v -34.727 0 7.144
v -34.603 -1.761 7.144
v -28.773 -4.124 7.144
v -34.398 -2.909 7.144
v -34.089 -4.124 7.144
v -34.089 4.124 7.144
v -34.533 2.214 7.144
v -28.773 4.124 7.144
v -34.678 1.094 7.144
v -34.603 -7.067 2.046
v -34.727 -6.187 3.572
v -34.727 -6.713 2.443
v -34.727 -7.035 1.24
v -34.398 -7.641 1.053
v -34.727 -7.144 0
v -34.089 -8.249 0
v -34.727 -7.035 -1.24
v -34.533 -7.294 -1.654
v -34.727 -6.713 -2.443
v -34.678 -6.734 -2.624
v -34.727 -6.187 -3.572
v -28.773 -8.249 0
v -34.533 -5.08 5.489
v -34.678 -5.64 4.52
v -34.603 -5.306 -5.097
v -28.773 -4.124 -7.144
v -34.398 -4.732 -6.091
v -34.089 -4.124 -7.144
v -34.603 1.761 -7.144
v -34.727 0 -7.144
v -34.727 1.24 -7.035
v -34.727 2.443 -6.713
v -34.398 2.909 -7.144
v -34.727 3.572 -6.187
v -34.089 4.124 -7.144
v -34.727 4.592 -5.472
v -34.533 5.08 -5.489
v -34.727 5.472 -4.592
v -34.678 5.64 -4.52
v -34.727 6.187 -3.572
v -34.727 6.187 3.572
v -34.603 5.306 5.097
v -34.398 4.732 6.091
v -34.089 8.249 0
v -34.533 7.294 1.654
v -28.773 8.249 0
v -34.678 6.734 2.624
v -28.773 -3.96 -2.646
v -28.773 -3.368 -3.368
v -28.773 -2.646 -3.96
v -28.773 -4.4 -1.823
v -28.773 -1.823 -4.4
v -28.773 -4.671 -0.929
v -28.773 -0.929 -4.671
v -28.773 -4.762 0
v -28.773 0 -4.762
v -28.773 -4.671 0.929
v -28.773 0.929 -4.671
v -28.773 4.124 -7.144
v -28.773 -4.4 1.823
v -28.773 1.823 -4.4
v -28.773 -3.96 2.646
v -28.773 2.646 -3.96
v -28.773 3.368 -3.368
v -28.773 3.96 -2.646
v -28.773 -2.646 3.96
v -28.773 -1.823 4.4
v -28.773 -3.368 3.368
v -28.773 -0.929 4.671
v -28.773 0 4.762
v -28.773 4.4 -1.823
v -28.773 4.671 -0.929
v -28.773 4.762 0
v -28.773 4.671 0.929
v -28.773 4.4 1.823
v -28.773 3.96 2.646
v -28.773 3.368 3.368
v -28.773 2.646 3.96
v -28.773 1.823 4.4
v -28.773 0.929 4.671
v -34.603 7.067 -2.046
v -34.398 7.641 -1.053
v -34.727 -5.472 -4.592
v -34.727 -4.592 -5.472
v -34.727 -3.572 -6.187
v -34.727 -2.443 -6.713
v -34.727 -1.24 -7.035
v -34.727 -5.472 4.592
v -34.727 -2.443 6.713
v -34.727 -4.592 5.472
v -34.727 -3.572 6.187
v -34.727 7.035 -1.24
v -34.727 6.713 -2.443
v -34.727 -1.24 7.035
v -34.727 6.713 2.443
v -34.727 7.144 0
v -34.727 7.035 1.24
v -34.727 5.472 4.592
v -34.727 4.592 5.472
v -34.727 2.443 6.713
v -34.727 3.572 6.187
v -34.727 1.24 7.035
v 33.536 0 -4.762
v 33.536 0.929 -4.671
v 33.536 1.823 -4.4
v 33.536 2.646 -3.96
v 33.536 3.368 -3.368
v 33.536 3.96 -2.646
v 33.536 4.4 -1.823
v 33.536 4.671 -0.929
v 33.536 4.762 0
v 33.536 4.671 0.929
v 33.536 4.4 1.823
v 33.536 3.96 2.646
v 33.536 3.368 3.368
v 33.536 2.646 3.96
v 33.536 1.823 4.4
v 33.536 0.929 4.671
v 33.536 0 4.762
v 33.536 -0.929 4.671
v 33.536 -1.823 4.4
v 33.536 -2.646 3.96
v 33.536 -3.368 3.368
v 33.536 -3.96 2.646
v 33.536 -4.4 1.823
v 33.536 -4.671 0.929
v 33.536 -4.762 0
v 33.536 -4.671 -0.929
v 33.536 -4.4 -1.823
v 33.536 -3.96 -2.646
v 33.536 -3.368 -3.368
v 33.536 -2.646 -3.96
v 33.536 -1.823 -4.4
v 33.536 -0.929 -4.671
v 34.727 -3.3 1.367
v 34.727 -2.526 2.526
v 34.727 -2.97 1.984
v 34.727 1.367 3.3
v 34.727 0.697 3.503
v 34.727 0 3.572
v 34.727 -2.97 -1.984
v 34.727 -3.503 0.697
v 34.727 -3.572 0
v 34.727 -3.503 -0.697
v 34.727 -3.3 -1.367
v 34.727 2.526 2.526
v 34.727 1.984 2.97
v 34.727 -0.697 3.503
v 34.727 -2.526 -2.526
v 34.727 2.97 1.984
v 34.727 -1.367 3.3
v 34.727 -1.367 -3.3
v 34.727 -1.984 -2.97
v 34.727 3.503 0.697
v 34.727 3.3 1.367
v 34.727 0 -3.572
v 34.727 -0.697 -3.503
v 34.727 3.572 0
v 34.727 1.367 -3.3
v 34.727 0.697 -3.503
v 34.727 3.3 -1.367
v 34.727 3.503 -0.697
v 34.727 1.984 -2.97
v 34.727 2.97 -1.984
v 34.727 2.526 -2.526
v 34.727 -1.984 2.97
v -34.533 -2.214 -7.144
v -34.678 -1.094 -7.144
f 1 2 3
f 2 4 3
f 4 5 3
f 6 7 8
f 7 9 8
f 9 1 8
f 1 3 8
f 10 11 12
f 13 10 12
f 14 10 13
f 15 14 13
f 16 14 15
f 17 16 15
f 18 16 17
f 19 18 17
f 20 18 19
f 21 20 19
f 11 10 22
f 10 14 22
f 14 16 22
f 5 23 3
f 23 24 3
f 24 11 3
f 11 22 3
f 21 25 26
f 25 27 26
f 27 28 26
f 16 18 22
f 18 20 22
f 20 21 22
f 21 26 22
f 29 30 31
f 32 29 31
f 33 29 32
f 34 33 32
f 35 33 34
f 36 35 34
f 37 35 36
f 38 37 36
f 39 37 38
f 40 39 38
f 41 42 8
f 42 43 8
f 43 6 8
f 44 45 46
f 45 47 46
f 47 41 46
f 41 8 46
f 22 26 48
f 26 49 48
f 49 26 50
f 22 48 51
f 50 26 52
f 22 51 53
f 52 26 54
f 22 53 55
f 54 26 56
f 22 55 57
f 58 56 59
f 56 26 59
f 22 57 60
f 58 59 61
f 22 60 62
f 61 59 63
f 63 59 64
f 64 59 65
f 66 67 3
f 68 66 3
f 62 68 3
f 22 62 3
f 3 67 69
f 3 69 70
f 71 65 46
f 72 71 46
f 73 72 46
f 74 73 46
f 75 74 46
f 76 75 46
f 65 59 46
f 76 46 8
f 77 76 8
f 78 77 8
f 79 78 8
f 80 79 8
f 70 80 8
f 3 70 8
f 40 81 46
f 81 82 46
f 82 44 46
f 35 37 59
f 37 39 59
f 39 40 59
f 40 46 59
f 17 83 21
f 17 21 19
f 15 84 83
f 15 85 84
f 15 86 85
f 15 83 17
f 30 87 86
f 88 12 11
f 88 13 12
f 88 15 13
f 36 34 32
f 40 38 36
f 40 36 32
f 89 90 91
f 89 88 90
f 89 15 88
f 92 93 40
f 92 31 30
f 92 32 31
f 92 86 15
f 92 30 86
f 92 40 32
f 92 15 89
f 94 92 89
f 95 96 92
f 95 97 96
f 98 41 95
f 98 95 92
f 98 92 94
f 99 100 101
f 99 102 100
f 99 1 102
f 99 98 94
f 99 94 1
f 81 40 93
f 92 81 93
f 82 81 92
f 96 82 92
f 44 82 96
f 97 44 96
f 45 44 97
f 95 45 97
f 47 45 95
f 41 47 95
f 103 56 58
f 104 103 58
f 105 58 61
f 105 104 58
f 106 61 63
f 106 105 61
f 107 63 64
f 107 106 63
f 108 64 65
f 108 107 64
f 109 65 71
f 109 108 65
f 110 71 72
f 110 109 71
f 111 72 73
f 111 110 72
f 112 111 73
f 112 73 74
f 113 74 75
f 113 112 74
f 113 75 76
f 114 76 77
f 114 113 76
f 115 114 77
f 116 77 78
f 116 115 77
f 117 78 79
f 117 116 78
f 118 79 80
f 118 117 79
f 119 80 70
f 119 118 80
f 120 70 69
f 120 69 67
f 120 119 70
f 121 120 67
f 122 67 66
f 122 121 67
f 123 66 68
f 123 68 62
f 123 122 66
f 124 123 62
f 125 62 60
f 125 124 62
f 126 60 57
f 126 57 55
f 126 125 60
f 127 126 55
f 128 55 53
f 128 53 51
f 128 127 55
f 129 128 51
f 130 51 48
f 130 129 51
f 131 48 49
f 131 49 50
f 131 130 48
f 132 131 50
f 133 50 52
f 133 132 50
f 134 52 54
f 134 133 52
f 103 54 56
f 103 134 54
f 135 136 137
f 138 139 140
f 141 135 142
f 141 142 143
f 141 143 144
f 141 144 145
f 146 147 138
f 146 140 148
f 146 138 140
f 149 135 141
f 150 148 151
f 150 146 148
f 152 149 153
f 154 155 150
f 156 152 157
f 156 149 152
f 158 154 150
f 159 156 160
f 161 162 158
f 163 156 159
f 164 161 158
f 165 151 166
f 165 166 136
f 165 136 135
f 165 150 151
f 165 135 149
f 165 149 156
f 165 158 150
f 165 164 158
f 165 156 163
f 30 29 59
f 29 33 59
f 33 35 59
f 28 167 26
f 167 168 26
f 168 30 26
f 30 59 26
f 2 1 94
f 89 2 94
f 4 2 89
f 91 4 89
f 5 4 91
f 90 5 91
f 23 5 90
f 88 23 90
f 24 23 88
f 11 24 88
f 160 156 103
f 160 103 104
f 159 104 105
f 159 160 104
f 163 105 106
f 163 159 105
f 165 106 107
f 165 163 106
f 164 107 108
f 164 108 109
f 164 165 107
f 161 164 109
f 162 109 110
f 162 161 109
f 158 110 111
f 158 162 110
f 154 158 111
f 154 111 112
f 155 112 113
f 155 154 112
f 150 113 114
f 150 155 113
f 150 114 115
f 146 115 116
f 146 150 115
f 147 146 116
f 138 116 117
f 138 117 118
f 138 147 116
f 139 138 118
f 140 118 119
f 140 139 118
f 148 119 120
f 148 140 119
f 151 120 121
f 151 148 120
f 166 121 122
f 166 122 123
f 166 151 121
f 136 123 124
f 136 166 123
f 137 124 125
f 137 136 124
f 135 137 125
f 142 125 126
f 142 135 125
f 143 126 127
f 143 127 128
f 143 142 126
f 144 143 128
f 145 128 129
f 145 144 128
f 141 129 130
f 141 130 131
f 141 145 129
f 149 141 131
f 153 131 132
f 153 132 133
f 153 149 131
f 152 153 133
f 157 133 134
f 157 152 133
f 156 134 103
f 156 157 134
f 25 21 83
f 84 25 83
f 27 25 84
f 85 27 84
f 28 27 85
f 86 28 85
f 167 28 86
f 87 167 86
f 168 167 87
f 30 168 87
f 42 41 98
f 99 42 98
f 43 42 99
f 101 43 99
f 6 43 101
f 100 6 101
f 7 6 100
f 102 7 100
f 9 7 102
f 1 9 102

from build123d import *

# Parameters (mm, degrees)
SKETCH5_R           = 4.7625
BOSS_EXTRUDE3_DEPTH = 63.5
CHAMFER1_SIZE       = 1.190625
BOSS_EXTRUDE4_DEPTH = 5.953125
SKETCH8_OUTSIDE_W   = 274.906
SKETCH8_OUTSIDE_H   = 277.116
SKETCH8_OUTSIDE_R   = 7.14375
CUT_EXTRUDE3_DEPTH  = 70.453125
CUT_EXTRUDE3_TAPER  = 60


with BuildPart() as part:
    # Sketch5 → Boss-Extrude3 (new body)
    with BuildSketch(Plane(origin=(34.7265625, 0, 0), x_dir=(0, 0, -1), z_dir=(1, 0, 0))):
        Circle(SKETCH5_R)
    extrude(amount=-BOSS_EXTRUDE3_DEPTH)

    # Chamfer1
    chamfer1_edges = [part.edges().sort_by_distance(p)[0] for p in [
        (34.7265625, 0, 4.7625),
    ]]
    chamfer(chamfer1_edges, length=CHAMFER1_SIZE)

    # Sketch6 → Boss-Extrude4 (add)
    with BuildSketch(Plane.ZY.offset(28.7734375)):
        Polygon((7.14375, 4.124445986), (0, 8.248891971), (-7.14375, 4.124445986), (-7.14375, -4.124445986), (0, -8.248891971), (7.14375, -4.124445986), align=None)
    extrude(amount=BOSS_EXTRUDE4_DEPTH)

    # Sketch8 outside → Cut-Extrude3 (cut, through all)
    with BuildSketch(Plane.ZY.offset(34.7265625)):
        Rectangle(SKETCH8_OUTSIDE_W, SKETCH8_OUTSIDE_H)
        Circle(SKETCH8_OUTSIDE_R, mode=Mode.SUBTRACT)
    extrude(amount=-CUT_EXTRUDE3_DEPTH, taper=CUT_EXTRUDE3_TAPER, mode=Mode.SUBTRACT)


solid = part.part
